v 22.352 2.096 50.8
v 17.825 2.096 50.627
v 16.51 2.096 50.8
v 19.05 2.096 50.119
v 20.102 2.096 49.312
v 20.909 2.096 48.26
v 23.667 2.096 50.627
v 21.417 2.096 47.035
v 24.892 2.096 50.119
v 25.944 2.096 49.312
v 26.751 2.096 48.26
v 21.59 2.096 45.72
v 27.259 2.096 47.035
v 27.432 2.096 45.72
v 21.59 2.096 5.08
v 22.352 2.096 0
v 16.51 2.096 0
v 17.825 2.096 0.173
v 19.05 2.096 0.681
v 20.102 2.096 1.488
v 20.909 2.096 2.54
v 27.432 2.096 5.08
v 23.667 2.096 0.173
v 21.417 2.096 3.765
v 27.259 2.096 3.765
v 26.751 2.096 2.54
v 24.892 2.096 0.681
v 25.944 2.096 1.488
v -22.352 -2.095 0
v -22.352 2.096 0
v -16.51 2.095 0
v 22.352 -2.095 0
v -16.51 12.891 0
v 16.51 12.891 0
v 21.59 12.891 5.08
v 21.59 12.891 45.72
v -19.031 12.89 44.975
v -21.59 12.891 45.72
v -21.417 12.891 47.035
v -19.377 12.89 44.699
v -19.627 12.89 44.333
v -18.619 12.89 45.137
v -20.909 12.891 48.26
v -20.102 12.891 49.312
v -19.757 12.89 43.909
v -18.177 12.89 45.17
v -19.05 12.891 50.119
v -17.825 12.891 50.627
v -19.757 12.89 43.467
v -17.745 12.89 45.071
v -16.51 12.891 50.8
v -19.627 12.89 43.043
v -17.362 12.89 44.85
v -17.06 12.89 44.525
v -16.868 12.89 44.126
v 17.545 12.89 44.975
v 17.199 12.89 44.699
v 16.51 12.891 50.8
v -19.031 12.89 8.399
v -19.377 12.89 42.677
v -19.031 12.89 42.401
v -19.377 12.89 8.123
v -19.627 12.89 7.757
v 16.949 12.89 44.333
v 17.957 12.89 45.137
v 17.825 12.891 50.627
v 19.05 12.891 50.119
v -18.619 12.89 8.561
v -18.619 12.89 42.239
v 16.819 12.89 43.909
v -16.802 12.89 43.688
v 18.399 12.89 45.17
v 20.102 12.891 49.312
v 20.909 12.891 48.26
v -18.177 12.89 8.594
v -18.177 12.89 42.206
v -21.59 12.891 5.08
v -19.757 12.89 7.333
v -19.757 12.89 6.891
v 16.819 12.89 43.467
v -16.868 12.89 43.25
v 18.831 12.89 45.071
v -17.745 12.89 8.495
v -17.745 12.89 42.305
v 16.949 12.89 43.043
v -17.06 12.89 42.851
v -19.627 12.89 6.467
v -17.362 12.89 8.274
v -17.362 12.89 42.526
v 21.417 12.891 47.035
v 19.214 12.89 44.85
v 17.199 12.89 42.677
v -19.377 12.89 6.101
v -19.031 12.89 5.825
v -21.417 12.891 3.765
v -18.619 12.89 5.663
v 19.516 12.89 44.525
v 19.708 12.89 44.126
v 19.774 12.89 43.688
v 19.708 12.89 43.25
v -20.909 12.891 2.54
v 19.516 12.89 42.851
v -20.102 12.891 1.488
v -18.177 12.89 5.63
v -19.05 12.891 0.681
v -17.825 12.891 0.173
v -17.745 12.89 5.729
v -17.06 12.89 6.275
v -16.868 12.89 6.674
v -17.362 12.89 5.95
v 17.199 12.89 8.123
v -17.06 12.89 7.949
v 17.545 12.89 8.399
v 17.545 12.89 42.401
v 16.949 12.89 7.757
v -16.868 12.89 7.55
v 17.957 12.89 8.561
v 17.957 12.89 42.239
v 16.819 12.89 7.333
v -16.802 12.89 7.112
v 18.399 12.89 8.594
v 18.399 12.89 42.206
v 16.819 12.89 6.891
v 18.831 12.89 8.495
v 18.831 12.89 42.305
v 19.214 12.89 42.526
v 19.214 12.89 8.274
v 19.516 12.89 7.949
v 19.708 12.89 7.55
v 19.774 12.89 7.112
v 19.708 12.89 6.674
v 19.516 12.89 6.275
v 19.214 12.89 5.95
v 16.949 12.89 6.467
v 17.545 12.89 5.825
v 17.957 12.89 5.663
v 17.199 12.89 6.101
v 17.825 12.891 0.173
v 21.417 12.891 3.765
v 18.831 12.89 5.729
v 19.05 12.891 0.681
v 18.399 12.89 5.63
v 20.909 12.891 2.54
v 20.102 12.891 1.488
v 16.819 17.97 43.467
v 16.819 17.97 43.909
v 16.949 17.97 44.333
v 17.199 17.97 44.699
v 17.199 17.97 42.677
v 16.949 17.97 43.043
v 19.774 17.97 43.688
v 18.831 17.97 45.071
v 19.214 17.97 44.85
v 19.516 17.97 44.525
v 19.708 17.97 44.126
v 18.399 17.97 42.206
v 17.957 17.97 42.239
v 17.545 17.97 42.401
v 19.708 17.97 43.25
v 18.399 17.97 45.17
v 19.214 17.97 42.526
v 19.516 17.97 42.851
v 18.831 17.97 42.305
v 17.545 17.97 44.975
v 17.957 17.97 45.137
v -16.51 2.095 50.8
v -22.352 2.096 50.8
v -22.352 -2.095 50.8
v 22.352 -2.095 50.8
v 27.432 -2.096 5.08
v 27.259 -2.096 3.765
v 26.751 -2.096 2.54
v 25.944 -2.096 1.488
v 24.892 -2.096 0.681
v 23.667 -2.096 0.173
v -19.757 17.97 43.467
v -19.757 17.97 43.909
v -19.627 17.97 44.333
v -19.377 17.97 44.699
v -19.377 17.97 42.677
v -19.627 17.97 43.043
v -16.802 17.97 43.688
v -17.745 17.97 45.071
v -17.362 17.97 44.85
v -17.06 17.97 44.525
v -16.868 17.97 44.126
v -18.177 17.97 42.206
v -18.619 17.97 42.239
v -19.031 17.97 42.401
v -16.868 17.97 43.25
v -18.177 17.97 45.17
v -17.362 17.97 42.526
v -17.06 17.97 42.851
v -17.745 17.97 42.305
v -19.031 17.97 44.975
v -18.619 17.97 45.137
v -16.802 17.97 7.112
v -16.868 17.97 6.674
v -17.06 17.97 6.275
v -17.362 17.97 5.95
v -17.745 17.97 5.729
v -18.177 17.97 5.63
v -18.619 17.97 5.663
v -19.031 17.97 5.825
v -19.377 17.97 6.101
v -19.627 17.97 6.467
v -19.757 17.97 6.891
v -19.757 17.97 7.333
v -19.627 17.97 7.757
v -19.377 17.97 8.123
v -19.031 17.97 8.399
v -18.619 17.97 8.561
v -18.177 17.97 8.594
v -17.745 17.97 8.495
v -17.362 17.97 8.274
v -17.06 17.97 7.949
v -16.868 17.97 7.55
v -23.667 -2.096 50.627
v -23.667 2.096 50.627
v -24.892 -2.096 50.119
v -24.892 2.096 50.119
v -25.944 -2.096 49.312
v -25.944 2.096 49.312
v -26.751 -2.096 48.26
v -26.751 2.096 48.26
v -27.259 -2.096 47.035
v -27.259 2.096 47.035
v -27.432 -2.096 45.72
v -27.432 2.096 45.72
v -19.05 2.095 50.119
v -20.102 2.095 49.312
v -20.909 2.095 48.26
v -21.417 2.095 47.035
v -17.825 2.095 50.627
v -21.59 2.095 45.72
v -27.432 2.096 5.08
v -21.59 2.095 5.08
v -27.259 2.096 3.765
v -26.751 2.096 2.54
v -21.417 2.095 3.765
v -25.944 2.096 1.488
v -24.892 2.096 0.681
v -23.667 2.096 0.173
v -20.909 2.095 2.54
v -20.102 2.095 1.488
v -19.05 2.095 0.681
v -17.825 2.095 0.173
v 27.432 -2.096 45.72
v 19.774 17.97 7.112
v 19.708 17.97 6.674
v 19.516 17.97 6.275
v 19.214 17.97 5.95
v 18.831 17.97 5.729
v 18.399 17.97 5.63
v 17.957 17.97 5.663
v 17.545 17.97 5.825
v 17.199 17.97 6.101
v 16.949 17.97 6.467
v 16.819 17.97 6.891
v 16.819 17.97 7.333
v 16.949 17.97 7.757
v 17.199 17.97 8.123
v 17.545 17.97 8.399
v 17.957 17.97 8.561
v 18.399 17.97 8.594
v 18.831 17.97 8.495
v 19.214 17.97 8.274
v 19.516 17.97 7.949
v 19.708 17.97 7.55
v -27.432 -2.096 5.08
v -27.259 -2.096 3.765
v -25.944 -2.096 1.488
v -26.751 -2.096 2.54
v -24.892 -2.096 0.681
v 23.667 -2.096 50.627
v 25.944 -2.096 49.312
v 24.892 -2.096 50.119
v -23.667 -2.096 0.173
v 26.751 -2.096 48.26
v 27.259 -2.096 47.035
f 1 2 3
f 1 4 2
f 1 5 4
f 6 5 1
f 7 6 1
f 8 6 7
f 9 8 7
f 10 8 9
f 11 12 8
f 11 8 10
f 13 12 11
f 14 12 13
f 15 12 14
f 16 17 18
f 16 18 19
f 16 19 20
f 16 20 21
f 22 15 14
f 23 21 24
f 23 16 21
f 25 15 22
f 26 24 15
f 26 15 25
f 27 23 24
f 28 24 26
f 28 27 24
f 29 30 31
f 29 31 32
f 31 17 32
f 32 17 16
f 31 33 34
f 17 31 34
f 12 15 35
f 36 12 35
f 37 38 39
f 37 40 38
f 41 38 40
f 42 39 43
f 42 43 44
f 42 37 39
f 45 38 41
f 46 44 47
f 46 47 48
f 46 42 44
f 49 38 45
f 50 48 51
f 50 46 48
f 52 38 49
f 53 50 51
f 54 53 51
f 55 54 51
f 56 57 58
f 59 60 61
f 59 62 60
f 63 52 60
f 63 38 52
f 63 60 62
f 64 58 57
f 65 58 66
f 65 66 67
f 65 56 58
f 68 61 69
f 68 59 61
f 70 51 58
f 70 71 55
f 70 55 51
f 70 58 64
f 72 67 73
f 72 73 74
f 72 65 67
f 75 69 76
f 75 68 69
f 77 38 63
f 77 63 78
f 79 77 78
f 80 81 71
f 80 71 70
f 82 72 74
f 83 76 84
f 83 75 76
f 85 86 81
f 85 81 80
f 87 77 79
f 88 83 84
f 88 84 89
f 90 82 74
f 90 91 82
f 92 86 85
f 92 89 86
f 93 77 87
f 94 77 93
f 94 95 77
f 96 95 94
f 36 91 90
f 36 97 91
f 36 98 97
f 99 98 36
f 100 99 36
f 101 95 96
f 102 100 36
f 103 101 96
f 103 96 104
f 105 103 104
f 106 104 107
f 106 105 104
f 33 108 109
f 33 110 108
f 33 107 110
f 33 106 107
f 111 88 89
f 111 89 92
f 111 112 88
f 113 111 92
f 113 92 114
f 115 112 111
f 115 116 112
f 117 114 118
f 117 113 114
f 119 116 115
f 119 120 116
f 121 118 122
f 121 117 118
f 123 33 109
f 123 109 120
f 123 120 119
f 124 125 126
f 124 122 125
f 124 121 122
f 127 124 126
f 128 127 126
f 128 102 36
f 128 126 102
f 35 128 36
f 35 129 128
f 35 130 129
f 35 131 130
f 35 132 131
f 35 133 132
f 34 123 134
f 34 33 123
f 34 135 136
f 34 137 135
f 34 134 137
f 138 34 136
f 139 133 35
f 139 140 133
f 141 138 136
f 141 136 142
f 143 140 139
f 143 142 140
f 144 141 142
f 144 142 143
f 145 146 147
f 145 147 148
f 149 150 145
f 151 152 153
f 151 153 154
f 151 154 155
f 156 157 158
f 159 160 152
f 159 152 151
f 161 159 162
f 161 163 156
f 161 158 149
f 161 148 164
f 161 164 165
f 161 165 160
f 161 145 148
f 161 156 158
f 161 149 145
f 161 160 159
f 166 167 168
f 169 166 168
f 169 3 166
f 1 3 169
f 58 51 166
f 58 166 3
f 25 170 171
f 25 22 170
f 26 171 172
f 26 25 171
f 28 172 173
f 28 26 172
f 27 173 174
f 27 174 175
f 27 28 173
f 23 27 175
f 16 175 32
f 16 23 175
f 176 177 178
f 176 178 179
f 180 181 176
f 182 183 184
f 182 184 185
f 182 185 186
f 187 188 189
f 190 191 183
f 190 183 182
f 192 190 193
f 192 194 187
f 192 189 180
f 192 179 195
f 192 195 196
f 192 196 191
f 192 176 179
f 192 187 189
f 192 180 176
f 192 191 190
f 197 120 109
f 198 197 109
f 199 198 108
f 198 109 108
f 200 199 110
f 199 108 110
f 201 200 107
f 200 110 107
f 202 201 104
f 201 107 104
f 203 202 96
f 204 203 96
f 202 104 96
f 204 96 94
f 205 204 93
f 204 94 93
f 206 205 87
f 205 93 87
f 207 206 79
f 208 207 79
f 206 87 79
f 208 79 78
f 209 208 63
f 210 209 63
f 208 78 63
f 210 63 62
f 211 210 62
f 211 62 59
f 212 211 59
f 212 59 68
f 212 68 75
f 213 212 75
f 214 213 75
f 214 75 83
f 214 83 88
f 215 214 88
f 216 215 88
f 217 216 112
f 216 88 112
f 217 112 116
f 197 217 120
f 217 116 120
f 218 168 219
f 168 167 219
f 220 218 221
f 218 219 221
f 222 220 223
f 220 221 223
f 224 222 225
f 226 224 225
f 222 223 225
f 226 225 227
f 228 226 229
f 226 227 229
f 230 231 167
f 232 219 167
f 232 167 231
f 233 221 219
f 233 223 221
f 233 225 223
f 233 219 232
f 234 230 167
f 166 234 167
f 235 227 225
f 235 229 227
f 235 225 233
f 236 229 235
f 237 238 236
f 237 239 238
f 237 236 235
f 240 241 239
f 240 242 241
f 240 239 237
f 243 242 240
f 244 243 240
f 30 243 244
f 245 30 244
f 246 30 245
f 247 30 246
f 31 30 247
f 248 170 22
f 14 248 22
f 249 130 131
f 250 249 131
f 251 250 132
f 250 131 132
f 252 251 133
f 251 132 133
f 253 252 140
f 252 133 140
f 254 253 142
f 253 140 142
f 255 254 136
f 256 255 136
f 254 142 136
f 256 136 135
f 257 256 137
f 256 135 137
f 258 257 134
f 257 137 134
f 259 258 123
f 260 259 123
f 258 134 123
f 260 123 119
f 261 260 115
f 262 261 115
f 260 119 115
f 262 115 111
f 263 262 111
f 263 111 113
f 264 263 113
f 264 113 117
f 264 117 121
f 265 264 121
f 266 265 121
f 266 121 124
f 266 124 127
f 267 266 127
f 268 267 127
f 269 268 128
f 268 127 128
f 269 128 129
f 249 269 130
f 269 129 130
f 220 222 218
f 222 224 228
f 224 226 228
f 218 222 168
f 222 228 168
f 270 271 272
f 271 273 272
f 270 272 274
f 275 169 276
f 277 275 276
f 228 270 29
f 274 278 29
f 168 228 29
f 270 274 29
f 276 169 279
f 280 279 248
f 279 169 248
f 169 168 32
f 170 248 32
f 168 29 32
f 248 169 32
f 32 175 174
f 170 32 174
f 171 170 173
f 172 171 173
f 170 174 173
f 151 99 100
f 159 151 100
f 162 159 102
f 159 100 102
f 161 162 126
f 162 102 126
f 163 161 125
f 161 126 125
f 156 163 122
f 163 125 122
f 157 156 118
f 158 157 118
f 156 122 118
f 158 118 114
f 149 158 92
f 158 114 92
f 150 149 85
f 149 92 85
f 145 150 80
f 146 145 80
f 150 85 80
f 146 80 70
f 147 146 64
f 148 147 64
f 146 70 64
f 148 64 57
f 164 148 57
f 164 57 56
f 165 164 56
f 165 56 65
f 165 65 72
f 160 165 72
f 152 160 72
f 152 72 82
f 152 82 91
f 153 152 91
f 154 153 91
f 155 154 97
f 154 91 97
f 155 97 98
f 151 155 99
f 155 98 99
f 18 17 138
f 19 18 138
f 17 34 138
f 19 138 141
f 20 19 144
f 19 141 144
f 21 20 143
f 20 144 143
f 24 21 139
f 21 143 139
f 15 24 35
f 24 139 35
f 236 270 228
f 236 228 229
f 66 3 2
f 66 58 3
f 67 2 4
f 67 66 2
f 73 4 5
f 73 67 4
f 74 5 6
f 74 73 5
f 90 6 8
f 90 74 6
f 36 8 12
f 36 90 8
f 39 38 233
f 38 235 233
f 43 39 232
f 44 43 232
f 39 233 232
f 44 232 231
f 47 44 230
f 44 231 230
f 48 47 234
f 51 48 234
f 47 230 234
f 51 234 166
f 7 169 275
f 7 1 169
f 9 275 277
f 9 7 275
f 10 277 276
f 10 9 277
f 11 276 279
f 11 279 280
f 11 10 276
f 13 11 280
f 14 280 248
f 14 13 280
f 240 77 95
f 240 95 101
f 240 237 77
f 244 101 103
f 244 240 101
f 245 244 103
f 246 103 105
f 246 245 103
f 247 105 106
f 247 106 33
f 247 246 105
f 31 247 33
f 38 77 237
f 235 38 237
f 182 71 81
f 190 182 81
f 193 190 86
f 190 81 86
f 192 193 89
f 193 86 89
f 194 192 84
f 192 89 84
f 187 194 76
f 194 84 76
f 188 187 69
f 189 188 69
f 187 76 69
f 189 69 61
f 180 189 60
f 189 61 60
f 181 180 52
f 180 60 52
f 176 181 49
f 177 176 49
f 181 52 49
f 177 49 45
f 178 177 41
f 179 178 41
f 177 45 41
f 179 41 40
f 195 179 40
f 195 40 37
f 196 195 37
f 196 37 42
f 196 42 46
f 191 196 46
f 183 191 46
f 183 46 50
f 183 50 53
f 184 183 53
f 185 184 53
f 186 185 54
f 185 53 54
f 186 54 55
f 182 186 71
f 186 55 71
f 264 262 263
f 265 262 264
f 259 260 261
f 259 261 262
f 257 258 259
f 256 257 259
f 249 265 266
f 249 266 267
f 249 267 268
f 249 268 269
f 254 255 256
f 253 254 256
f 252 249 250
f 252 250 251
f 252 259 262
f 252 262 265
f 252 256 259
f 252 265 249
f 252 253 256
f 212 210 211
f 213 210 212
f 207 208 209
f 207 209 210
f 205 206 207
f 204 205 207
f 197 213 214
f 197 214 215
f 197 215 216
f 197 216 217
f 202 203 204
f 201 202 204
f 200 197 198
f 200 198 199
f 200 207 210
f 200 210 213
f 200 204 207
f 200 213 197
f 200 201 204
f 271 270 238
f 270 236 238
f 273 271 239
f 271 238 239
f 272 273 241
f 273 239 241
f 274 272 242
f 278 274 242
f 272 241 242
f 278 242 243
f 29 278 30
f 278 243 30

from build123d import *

# Parameters (mm, degrees)
SKETCH1_W           = 43.18
SKETCH1_H           = 7.62
SKETCH1_H_2         = 3.175
SKETCH1_W_2         = 54.864
SKETCH1_H_3         = 4.191
BOSS_EXTRUDE1_DEPTH = 50.8
SKETCH2_R           = 1.4859
BOSS_EXTRUDE2_DEPTH = 5.08
FILLET1_R           = 5.08
FILLET2_R           = 5.08


with BuildPart() as part:
    # Sketch1 → Boss-Extrude1 (new body)
    with BuildSketch(Plane.XY):
        with Locations((0, 9.0805)):
            Rectangle(SKETCH1_W, SKETCH1_H)
        with Locations((0, 3.683)):
            Rectangle(SKETCH1_W, SKETCH1_H_2)
        Rectangle(SKETCH1_W_2, SKETCH1_H_3)
    extrude(amount=BOSS_EXTRUDE1_DEPTH)

    # Sketch2 → Boss-Extrude2 (add)
    with BuildSketch(Plane(origin=(0, 12.8905, 0), x_dir=(1, 0, 0), z_dir=(0, 1, 0))):
        with Locations((-18.288, -7.112)):
            Circle(SKETCH2_R)
        with Locations((18.288, -7.112)):
            Circle(SKETCH2_R)
        with Locations((18.288, -43.688)):
            Circle(SKETCH2_R)
        with Locations((-18.288, -43.688)):
            Circle(SKETCH2_R)
    extrude(amount=BOSS_EXTRUDE2_DEPTH)

    # Fillet1
    fillet1_edges = [part.edges().sort_by_distance(p)[0] for p in [
        (21.59, 7.493, 0),
        (-21.59, 7.493, 0),
        (21.59, 7.493, 50.8),
        (-21.59, 7.493, 50.8),
    ]]
    fillet(fillet1_edges, radius=FILLET1_R)

    # Fillet2
    fillet2_edges = [part.edges().sort_by_distance(p)[0] for p in [
        (27.432, 0, 0),
        (-27.432, 0, 0),
        (-27.432, 0, 50.8),
        (27.432, 0, 50.8),
    ]]
    fillet(fillet2_edges, radius=FILLET2_R)


solid = part.part
